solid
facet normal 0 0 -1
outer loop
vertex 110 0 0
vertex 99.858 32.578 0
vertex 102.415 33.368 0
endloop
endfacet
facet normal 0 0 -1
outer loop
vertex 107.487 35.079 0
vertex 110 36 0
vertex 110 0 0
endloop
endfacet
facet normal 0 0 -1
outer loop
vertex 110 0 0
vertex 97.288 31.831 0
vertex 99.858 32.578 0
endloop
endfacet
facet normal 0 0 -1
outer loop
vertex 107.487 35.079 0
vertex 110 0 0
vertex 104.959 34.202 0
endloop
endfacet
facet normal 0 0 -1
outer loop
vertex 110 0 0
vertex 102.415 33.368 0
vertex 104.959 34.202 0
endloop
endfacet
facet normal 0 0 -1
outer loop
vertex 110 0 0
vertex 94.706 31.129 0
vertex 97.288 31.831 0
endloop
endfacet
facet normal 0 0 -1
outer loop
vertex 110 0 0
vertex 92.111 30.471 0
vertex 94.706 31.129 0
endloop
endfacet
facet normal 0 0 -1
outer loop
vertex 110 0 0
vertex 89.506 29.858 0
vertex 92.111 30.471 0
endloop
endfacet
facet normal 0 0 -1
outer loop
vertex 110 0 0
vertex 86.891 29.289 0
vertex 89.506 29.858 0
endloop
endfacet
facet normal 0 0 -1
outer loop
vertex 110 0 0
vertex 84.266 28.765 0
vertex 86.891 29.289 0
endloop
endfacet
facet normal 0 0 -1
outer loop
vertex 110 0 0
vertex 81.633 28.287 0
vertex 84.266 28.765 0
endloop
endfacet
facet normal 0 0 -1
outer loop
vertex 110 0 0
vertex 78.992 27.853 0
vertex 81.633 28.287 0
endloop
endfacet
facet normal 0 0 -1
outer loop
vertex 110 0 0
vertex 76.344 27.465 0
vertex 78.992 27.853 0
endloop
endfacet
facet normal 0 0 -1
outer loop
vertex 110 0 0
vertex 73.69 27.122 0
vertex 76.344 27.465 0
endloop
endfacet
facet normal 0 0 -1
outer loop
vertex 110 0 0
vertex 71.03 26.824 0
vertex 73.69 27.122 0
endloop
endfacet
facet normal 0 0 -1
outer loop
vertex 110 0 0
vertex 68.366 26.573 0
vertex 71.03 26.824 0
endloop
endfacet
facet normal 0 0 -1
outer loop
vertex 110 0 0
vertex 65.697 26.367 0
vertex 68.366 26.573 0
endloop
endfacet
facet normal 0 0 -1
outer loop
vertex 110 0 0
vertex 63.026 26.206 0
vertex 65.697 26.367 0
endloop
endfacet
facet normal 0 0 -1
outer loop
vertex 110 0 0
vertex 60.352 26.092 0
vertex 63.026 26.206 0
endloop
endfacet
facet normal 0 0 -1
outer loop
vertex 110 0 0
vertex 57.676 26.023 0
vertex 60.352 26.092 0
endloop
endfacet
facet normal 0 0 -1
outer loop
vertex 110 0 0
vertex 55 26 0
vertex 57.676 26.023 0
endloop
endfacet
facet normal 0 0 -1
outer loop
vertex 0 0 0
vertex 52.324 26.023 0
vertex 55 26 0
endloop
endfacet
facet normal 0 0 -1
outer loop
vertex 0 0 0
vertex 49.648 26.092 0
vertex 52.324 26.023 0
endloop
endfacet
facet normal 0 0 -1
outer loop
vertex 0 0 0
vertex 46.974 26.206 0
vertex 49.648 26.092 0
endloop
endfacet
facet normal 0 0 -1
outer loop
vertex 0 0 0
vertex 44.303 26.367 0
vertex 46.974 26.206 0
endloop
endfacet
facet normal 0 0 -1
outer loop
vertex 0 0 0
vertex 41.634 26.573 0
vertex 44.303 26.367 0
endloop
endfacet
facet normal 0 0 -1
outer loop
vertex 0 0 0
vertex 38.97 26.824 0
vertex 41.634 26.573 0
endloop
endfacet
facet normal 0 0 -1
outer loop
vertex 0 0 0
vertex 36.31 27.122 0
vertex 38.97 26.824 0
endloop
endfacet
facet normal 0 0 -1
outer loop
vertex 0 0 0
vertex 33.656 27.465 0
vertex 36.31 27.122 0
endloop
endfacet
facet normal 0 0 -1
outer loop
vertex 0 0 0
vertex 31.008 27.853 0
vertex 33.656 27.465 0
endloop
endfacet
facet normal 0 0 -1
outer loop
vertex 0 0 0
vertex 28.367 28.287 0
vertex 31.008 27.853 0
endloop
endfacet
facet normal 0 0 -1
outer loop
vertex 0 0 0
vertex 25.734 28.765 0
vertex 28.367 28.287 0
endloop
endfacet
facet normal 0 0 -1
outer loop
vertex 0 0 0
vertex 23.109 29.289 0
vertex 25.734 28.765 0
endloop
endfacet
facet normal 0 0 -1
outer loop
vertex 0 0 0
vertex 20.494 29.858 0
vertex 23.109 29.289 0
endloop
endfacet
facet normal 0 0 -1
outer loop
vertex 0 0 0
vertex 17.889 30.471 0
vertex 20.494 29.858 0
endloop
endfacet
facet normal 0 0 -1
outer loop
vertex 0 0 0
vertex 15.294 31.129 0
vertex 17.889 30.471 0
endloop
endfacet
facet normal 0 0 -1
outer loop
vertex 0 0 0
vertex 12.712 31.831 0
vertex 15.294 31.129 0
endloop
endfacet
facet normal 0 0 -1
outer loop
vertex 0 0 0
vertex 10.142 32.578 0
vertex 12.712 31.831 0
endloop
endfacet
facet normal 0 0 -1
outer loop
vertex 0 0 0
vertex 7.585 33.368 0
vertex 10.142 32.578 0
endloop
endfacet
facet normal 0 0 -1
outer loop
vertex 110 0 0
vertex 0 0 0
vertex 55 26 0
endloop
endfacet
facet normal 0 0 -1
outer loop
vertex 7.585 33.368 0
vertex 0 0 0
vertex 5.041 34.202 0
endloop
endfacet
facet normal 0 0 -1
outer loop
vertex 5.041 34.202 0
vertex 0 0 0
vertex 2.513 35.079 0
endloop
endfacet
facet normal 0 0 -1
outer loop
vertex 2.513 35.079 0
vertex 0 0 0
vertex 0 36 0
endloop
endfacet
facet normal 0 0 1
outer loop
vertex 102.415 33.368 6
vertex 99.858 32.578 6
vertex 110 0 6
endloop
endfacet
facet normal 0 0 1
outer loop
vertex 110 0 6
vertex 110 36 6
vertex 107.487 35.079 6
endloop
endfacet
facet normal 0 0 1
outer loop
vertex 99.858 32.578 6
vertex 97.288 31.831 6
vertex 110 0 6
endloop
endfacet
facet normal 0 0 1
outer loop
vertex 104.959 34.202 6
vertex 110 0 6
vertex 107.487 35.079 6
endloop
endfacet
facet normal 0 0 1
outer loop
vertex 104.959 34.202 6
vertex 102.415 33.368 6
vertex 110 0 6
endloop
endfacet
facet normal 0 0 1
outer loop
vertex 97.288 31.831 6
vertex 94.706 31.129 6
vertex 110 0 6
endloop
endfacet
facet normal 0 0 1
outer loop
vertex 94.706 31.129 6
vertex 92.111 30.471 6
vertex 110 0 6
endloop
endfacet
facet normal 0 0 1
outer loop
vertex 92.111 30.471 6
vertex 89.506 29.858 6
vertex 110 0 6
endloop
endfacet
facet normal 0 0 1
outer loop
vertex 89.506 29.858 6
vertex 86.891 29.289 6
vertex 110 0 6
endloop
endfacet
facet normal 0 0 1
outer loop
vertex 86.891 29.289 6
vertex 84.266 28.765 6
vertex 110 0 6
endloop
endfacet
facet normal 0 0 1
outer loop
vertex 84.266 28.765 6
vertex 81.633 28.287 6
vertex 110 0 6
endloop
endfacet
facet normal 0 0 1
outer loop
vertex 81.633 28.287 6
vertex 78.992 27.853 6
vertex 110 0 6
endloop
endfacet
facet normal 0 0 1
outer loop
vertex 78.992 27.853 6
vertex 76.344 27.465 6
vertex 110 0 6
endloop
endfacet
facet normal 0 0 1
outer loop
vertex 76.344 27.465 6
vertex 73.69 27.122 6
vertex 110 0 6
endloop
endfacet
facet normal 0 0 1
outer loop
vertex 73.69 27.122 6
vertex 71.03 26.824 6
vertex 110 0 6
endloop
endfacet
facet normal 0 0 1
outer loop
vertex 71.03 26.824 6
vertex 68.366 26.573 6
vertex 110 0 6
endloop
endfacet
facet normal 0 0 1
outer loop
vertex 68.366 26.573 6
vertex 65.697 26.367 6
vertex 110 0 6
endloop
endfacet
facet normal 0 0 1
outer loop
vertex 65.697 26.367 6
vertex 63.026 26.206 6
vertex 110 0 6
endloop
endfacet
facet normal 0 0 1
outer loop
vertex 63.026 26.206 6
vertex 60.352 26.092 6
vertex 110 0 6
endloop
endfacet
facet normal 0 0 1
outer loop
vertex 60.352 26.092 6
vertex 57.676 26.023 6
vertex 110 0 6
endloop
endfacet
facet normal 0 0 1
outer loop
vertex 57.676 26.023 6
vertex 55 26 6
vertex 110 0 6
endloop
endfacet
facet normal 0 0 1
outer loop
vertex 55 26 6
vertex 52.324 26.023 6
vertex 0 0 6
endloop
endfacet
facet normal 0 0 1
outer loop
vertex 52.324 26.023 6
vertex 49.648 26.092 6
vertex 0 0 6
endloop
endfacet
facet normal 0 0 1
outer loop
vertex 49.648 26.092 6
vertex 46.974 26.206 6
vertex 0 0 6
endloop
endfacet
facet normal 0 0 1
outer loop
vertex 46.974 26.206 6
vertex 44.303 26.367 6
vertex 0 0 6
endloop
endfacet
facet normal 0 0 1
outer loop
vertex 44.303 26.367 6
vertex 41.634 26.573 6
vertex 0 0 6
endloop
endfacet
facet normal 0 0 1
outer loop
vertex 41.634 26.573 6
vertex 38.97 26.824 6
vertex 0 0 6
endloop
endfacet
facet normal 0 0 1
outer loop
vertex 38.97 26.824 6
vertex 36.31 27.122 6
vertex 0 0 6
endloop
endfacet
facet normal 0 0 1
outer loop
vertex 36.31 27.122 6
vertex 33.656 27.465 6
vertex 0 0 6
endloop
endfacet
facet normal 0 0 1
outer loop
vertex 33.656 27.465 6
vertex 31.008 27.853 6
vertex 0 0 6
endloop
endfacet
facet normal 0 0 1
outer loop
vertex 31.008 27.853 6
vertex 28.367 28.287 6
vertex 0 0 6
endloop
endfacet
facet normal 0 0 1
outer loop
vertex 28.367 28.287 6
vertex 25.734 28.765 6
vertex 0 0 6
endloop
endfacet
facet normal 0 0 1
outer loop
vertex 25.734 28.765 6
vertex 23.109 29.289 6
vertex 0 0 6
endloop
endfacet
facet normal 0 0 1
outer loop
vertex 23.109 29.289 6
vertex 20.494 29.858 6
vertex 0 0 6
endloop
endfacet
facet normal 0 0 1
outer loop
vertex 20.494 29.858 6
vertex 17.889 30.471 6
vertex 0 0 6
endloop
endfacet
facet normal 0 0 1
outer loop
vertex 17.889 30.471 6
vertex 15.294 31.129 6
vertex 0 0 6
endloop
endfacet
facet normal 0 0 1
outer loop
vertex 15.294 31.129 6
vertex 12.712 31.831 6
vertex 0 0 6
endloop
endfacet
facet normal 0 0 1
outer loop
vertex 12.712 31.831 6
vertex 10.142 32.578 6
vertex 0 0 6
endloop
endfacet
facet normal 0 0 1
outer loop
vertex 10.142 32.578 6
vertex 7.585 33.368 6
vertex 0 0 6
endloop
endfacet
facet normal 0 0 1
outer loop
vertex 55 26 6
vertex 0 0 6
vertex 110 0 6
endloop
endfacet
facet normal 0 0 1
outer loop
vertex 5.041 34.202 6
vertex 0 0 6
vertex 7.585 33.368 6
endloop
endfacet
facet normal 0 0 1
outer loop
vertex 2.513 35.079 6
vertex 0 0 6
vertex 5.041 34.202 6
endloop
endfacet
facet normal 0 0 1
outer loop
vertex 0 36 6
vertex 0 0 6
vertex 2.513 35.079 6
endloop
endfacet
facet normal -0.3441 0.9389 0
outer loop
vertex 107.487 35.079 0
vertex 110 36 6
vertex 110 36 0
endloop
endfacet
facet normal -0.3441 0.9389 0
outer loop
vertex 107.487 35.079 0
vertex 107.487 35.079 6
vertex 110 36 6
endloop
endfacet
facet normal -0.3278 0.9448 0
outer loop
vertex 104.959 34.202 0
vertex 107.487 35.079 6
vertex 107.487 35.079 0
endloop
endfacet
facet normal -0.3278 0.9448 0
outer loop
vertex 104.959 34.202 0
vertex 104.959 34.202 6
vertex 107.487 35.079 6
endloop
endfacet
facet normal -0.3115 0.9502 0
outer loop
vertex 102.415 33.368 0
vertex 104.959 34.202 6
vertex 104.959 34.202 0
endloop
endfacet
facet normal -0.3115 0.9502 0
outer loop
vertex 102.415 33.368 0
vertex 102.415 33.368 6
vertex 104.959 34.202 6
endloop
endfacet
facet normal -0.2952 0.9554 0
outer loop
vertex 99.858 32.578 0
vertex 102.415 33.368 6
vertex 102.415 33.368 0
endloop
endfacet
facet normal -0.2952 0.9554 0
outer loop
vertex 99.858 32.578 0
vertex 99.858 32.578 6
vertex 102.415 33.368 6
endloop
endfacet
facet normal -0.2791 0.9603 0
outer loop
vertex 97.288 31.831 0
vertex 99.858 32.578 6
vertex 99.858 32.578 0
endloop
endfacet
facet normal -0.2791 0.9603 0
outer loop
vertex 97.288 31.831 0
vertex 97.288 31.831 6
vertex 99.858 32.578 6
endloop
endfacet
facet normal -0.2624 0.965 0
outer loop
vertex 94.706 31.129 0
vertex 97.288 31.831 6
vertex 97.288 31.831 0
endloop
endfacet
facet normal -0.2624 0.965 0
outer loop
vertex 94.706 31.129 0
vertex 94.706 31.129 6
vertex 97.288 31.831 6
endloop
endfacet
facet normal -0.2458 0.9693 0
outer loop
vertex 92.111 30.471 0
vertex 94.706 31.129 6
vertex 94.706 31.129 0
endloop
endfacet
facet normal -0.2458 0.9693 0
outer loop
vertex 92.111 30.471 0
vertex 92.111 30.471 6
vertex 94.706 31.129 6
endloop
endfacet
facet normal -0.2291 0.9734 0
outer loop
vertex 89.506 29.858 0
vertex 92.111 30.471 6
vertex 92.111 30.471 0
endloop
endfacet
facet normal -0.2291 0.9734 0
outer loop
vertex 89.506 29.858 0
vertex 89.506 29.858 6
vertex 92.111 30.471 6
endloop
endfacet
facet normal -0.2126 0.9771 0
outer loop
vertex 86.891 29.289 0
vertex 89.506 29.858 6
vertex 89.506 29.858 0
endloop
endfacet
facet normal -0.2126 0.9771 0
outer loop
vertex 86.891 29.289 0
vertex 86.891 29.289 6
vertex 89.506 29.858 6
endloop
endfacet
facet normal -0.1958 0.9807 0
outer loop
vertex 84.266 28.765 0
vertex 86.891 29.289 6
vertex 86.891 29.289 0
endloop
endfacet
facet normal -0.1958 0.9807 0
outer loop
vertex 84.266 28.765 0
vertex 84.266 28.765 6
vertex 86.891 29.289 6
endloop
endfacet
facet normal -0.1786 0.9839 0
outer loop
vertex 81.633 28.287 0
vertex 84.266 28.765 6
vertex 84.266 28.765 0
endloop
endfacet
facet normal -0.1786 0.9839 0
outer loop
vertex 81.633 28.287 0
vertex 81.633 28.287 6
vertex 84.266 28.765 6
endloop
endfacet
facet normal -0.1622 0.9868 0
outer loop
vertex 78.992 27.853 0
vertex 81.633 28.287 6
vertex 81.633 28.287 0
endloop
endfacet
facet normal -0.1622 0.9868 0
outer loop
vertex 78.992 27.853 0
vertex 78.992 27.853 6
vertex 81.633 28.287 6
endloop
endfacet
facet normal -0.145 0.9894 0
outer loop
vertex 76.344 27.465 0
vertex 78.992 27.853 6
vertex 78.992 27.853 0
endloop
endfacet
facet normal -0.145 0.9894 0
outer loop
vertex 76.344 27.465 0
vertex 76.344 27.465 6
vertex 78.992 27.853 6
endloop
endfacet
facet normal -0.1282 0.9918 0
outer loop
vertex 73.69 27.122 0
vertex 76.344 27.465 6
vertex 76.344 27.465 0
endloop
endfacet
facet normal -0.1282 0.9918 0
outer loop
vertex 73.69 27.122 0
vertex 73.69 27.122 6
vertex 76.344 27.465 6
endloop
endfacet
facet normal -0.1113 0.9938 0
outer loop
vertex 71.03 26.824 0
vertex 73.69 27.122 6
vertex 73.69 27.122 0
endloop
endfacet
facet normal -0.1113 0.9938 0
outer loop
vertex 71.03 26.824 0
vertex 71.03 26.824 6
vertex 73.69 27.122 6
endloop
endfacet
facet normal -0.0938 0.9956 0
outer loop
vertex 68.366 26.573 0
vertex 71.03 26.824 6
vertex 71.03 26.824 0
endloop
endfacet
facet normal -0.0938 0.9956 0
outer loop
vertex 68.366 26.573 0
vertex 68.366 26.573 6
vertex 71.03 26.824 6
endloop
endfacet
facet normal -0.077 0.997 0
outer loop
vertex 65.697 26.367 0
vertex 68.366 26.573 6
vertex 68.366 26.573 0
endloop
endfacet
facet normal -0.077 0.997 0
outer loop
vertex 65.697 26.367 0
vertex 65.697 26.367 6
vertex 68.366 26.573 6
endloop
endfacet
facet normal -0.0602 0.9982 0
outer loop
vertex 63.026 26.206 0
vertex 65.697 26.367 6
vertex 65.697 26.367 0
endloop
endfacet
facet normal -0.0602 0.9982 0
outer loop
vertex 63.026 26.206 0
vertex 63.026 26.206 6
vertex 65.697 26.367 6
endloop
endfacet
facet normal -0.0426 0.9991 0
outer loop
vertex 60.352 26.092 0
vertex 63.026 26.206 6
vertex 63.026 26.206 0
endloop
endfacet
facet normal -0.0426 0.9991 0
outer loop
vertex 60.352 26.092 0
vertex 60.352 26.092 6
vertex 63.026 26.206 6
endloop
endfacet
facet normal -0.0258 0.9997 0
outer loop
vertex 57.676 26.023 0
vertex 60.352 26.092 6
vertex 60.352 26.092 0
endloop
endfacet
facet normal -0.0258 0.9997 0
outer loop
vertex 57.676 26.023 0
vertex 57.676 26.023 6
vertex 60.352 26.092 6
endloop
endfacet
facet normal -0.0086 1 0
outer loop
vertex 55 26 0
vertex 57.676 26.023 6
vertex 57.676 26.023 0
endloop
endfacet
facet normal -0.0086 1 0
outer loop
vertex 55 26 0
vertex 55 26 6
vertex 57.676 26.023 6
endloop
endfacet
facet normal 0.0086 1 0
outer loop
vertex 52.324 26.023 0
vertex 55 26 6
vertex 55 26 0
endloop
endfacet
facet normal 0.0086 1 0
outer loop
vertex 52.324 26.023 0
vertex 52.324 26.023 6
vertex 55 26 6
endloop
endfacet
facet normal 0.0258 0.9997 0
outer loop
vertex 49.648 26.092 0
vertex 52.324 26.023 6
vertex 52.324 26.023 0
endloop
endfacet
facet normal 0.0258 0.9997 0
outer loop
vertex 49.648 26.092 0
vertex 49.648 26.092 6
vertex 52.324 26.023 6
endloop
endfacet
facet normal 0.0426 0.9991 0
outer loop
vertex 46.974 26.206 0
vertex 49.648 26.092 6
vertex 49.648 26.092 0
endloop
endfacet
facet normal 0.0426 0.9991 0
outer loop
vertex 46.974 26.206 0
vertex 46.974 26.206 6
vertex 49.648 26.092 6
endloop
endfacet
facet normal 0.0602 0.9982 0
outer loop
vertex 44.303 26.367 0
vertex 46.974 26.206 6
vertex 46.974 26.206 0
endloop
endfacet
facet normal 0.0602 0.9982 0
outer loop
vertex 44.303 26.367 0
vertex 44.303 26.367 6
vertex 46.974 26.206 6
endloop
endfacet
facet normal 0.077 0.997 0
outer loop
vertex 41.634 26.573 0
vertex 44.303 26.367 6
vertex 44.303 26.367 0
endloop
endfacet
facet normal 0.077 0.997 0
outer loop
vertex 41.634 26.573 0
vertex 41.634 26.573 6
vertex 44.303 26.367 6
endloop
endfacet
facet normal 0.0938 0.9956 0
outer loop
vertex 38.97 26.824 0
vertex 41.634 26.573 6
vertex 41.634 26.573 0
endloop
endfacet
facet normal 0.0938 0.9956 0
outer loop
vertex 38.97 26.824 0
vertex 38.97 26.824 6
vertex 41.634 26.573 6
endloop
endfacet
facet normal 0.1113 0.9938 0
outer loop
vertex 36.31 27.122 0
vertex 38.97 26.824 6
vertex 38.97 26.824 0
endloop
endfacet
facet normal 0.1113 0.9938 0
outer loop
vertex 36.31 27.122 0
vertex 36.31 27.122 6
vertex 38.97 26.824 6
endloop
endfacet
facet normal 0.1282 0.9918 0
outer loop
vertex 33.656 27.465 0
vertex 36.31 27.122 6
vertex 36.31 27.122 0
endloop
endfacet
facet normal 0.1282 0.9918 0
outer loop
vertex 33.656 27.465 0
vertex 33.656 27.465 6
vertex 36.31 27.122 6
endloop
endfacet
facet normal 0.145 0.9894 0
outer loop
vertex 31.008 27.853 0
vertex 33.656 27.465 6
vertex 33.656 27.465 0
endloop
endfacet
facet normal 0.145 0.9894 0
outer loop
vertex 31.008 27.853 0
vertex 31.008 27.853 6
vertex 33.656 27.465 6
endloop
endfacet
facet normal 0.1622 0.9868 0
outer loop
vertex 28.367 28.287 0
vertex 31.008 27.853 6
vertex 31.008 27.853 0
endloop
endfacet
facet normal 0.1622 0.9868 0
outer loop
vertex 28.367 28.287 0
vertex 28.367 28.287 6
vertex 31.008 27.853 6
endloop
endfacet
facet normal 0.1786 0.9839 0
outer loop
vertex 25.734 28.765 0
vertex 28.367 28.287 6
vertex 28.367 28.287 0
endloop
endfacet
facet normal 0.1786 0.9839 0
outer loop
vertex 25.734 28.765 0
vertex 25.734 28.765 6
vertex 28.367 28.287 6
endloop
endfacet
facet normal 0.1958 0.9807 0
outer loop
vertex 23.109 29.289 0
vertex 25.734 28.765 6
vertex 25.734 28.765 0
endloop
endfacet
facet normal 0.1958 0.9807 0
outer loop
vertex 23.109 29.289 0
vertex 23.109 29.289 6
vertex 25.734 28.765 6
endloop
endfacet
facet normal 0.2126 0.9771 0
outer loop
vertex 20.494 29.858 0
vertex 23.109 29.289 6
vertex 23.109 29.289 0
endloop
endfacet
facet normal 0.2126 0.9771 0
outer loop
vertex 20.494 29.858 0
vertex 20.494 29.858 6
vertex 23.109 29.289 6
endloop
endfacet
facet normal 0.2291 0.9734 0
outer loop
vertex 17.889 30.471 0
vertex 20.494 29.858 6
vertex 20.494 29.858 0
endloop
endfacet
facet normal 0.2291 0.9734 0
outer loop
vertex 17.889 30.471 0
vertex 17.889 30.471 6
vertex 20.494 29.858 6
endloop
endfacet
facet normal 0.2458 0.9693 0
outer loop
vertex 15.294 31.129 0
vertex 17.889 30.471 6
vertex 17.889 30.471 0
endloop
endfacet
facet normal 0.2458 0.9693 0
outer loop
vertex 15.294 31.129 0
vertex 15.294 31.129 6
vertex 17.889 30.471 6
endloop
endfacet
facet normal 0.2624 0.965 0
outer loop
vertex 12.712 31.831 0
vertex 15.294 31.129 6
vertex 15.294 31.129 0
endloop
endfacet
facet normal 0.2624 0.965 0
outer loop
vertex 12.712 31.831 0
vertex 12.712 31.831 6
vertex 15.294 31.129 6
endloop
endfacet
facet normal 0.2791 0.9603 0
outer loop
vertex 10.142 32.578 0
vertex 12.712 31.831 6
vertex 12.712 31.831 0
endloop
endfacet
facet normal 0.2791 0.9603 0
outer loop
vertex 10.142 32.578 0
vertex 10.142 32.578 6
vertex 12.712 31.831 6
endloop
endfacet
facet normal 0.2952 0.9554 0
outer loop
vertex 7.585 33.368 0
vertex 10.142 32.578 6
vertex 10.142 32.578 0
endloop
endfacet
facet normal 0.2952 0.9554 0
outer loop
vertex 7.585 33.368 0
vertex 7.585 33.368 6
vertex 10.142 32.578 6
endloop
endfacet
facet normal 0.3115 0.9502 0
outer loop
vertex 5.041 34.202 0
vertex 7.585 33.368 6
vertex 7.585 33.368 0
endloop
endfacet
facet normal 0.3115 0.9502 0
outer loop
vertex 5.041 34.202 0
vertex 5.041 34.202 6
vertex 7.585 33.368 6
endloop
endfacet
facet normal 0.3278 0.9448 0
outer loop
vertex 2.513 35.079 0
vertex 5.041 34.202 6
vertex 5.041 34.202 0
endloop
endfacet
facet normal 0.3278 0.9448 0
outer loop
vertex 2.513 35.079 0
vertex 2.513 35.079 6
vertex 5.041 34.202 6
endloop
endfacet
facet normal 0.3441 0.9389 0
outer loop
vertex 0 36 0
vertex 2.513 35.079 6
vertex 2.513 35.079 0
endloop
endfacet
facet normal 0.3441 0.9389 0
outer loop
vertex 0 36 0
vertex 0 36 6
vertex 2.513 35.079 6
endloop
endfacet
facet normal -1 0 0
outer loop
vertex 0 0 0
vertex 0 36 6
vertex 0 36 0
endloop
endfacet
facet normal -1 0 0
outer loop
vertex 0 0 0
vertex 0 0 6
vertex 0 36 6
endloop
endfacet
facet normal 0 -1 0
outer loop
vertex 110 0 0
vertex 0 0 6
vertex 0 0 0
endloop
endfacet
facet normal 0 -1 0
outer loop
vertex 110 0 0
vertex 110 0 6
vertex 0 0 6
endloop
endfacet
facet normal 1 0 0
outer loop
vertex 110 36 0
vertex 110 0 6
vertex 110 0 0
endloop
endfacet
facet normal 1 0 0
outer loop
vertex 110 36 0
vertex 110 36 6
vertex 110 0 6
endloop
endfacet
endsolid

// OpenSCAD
$fn = 32;

// ----------------------------------------------------------------------
// Arc profile plate: notch, 45 points
// ----------------------------------------------------------------------

// --- parameters (mm) ---
bar_l = 110;              // bar length, X
bar_w = 36;               // bar width, Y
notch_depth = 10;         // depth of the arc notch at mid-span
arc_r = 156.25;           // radius of the notch arc
arc_angle = 41.22;        // notch arc angle, degrees
arc_step = 1;             // sampling step of the notch arc, degrees
plate_t = 6;              // plate thickness, Z
fit_tol = 0.05;           // declared fit tolerance (prompt contract)
free_tol = 0.3;           // declared free tolerance (prompt contract)

profile = [[0, 0], [110, 0], [110, 36], [107.487, 35.079], [104.959, 34.202], [102.415, 33.368], [99.858, 32.578], [97.288, 31.831], [94.706, 31.129], [92.111, 30.471], [89.506, 29.858], [86.891, 29.289], [84.266, 28.765], [81.633, 28.287], [78.992, 27.853], [76.344, 27.465], [73.69, 27.122], [71.03, 26.824], [68.366, 26.573], [65.697, 26.367], [63.026, 26.206], [60.352, 26.092], [57.676, 26.023], [55, 26], [52.324, 26.023], [49.648, 26.092], [46.974, 26.206], [44.303, 26.367], [41.634, 26.573], [38.97, 26.824], [36.31, 27.122], [33.656, 27.465], [31.008, 27.853], [28.367, 28.287], [25.734, 28.765], [23.109, 29.289], [20.494, 29.858], [17.889, 30.471], [15.294, 31.129], [12.712, 31.831], [10.142, 32.578], [7.585, 33.368], [5.041, 34.202], [2.513, 35.079], [0, 36]];  // primary outline, 45 points, counter clockwise

// --- the one profile operation ---
linear_extrude(height = plate_t) polygon(points = profile);
